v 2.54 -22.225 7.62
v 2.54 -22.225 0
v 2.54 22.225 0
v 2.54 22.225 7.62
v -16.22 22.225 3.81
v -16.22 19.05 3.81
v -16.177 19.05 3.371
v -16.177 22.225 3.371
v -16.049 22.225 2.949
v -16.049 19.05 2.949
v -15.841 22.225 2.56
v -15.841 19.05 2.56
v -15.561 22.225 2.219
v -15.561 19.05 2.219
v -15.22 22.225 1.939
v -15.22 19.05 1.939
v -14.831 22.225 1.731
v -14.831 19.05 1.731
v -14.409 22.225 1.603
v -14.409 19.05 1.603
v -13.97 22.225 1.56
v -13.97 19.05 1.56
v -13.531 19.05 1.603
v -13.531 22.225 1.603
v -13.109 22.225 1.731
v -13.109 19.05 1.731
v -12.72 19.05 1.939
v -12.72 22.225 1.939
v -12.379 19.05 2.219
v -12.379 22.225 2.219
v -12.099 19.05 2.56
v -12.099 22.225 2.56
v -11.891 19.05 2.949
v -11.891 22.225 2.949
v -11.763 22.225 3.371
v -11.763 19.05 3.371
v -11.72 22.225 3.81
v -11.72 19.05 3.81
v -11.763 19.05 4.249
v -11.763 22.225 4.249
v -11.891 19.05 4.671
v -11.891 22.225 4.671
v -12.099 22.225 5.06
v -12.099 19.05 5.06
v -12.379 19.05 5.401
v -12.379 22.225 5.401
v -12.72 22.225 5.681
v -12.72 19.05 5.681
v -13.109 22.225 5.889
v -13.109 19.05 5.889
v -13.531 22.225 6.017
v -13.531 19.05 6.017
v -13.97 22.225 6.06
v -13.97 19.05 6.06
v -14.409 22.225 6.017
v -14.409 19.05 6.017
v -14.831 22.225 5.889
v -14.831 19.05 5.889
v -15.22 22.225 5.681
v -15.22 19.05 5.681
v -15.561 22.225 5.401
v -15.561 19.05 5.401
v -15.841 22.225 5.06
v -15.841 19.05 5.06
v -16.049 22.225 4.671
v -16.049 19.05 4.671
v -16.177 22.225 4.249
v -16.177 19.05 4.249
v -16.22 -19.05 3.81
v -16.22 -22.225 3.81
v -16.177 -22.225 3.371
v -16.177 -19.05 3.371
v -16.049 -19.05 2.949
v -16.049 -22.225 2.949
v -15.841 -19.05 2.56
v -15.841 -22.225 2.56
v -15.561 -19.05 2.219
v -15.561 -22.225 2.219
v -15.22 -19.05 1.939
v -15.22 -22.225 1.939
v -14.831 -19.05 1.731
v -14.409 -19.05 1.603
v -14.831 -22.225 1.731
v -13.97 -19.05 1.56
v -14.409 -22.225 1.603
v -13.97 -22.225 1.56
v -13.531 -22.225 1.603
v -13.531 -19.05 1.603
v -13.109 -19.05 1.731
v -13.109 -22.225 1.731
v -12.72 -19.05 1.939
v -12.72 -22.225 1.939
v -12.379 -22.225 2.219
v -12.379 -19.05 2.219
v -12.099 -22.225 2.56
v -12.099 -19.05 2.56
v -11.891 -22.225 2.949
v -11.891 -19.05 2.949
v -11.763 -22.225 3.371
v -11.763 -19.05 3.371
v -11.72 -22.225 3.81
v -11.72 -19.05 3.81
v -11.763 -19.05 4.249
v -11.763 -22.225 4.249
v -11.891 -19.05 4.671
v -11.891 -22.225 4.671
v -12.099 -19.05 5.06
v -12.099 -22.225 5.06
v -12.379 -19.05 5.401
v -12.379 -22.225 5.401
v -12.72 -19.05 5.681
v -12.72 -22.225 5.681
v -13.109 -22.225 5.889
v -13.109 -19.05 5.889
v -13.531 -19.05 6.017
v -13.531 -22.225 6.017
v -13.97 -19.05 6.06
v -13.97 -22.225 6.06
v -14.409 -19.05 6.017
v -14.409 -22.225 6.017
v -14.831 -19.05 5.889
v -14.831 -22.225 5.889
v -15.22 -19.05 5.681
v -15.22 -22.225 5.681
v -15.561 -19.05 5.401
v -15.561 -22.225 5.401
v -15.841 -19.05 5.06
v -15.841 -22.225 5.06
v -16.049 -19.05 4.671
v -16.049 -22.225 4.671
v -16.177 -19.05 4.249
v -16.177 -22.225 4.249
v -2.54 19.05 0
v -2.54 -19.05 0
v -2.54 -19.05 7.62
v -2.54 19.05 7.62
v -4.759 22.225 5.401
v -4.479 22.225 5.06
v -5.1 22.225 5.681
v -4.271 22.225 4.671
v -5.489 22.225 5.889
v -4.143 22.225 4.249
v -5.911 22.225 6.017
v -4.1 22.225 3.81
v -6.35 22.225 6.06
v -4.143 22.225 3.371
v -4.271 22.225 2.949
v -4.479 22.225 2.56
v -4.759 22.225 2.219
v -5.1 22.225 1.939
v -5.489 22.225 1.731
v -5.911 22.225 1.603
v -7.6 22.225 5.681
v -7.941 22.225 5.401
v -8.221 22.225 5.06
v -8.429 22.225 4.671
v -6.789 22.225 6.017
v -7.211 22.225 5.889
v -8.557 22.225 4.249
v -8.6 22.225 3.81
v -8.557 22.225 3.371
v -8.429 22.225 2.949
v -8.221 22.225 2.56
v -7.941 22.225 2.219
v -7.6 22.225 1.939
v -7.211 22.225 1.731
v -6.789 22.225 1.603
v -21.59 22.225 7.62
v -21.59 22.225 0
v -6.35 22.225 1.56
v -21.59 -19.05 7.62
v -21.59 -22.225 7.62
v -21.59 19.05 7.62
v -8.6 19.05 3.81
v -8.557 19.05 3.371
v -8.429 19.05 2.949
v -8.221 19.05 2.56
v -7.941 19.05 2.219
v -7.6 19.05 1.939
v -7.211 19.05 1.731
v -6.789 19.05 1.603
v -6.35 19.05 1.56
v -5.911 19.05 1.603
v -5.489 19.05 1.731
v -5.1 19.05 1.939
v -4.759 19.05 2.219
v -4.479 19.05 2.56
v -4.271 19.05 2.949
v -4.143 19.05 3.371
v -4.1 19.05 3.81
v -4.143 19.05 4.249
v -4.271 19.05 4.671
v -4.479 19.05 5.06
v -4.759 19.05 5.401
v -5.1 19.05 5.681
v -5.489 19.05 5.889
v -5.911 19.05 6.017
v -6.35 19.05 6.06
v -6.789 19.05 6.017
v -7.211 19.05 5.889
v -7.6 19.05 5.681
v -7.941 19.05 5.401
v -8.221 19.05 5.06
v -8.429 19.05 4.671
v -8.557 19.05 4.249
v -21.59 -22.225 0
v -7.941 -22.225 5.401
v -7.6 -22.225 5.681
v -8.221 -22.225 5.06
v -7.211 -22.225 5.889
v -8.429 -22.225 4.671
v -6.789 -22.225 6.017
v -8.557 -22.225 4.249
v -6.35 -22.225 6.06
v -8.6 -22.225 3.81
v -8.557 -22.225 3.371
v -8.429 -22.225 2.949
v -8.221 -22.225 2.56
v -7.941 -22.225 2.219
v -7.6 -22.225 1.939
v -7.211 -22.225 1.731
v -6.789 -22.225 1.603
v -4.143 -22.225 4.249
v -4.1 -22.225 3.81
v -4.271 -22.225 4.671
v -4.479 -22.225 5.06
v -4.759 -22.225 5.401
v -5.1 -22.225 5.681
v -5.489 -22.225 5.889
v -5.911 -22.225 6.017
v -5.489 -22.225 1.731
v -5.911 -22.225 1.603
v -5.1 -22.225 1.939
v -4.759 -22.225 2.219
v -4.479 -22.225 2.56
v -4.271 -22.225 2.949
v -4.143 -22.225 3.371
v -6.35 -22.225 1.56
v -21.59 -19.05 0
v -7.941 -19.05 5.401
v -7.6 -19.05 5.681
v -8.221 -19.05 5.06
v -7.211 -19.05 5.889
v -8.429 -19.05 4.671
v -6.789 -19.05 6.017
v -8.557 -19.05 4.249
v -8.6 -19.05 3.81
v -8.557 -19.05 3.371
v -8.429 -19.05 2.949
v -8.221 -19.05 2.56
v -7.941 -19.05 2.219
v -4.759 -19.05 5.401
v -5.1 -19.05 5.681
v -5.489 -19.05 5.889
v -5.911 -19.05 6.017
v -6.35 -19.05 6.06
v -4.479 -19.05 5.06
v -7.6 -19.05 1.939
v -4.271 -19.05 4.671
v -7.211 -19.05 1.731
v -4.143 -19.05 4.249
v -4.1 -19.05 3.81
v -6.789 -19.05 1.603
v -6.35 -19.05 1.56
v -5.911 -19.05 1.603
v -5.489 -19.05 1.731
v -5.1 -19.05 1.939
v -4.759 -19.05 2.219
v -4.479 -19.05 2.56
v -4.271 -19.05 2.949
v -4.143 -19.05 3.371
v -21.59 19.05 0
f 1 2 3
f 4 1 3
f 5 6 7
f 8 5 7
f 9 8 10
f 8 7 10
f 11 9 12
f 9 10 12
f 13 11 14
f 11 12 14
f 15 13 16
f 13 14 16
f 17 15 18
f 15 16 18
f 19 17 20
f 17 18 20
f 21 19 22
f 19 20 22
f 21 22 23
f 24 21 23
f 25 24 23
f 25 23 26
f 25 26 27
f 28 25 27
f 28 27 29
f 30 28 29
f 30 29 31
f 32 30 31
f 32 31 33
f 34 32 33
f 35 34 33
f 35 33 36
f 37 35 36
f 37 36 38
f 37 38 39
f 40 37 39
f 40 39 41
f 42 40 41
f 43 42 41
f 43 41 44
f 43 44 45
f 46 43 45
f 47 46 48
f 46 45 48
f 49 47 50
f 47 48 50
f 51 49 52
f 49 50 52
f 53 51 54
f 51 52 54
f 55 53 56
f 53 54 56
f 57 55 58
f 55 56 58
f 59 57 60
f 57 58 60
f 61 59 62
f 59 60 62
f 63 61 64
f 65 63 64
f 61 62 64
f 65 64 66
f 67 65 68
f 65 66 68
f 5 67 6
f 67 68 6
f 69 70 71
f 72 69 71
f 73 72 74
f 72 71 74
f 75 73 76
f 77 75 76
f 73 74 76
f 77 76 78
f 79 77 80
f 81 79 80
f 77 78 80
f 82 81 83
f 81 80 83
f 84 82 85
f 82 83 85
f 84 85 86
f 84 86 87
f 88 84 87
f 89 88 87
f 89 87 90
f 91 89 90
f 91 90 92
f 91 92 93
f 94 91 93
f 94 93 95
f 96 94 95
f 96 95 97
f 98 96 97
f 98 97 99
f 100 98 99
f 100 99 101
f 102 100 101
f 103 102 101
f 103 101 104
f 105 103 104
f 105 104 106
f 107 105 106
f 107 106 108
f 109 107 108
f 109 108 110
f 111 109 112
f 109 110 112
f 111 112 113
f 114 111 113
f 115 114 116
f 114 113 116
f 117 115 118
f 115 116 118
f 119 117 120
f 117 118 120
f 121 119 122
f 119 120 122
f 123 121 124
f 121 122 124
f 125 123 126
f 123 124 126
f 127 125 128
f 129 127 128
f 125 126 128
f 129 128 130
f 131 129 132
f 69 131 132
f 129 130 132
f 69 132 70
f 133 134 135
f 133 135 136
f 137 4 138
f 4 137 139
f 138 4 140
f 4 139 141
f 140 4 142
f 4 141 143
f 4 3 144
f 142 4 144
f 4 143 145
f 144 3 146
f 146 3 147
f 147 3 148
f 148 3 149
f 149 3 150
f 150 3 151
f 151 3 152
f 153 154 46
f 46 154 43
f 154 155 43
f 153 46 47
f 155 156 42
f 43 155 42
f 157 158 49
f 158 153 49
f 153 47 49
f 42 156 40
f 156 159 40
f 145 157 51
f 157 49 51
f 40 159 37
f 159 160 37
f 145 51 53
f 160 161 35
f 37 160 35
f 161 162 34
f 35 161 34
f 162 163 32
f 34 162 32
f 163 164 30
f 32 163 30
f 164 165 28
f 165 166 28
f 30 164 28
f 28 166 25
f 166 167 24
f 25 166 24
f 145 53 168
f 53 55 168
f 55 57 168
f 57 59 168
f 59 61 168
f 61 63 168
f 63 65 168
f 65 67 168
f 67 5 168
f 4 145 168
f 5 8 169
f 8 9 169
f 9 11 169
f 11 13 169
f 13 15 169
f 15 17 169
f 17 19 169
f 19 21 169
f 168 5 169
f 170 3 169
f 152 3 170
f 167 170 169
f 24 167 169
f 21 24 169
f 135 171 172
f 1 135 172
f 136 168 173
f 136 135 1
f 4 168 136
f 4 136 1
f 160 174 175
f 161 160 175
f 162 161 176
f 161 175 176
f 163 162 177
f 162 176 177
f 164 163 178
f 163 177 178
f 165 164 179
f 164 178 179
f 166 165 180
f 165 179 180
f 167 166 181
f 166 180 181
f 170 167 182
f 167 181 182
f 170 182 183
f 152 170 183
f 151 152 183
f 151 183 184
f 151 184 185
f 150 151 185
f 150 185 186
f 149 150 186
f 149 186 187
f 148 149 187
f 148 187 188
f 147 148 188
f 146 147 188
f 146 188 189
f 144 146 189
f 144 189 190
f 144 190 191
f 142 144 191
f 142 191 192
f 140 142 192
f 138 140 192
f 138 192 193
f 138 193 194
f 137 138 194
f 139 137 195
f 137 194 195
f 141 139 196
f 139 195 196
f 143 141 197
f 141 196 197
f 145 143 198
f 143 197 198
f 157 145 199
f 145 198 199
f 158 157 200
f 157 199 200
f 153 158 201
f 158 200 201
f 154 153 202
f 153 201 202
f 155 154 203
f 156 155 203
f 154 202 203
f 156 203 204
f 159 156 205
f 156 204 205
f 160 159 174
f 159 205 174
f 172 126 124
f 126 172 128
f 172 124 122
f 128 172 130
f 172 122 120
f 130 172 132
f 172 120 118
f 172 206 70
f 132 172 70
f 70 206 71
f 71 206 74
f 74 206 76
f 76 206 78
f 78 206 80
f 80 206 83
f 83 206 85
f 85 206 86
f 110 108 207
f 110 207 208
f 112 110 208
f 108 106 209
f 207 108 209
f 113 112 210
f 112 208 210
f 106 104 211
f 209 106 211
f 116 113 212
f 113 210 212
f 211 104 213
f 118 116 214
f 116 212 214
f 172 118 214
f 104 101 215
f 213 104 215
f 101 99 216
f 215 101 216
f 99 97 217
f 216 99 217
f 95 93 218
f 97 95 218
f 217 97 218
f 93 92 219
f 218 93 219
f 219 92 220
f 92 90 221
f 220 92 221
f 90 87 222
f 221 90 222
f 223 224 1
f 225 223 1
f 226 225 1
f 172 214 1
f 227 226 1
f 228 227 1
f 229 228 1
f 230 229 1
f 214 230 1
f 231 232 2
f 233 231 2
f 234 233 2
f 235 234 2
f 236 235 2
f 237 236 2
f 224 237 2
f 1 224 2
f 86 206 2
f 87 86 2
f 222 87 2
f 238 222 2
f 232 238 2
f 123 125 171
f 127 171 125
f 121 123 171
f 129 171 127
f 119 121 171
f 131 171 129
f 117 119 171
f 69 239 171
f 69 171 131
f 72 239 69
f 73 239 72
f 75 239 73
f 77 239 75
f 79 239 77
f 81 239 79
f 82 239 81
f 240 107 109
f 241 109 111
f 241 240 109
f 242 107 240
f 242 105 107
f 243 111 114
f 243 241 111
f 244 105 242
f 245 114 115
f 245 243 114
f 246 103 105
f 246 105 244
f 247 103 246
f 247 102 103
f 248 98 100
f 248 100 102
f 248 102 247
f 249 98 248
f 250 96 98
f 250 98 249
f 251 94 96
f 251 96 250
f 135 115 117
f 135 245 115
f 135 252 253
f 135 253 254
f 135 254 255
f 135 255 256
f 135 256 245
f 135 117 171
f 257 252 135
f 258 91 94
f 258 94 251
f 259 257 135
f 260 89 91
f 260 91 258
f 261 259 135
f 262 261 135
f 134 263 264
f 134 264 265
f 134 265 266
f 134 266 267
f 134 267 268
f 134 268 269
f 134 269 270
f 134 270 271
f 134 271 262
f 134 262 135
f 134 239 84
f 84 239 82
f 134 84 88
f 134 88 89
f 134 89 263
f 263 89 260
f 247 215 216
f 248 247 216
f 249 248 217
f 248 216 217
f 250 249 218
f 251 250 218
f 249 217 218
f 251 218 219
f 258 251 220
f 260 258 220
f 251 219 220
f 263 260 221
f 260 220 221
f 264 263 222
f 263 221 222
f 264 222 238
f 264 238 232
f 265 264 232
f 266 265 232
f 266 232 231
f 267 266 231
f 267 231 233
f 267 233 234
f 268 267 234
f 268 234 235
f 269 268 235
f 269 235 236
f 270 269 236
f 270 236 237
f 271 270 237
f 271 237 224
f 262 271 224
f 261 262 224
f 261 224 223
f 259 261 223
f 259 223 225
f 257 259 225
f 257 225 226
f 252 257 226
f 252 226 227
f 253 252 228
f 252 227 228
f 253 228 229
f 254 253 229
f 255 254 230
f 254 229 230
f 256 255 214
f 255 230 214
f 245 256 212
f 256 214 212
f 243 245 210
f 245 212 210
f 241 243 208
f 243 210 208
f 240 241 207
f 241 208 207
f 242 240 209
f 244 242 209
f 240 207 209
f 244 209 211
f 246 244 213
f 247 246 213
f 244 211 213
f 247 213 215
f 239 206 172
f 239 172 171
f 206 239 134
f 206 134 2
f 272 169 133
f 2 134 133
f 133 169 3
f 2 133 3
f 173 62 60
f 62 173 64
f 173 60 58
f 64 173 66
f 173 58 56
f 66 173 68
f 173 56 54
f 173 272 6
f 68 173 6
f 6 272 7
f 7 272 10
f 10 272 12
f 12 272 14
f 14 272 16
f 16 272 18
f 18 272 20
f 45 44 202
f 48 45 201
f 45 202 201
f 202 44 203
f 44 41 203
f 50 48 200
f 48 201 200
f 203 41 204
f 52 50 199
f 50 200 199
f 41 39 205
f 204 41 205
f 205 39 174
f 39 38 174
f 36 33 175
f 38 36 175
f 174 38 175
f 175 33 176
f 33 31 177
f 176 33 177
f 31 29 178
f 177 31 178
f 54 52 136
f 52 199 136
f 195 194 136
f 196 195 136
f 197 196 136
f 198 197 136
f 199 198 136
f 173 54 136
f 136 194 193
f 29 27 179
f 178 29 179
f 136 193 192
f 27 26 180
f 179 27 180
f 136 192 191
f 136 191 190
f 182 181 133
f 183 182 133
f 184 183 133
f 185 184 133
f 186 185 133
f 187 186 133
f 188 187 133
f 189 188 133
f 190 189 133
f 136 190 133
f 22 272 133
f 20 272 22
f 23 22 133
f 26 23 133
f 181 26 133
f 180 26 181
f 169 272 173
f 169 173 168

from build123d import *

# Parameters (mm, degrees)
SKETCH1_W            = 19.05
SKETCH1_H            = 3.175
SKETCH1_W_2          = 5.08
SKETCH1_H_2          = 44.45
BOSS_EXTRUDE1_DEPTH  = 7.62
M4_CLEARANCE_HOLE1_D = 4.5


with BuildPart() as part:
    # Sketch1 → Boss-Extrude1 (new body)
    with BuildSketch(Plane.XY):
        with Locations((-12.065, 20.6375)):
            Rectangle(SKETCH1_W, SKETCH1_H)
        Rectangle(SKETCH1_W_2, SKETCH1_H_2)
        with Locations((-12.065, -20.6375)):
            Rectangle(SKETCH1_W, SKETCH1_H)
    extrude(amount=BOSS_EXTRUDE1_DEPTH)

    # M4 Clearance Hole1 (through all)
    with Locations(Plane(origin=(0, 22.225, 0), x_dir=(1, 0, 0), z_dir=(0, 1, 0))):
        with Locations((-13.97, -3.81), (-6.35, -3.81)):
            Hole(M4_CLEARANCE_HOLE1_D / 2)


solid = part.part
